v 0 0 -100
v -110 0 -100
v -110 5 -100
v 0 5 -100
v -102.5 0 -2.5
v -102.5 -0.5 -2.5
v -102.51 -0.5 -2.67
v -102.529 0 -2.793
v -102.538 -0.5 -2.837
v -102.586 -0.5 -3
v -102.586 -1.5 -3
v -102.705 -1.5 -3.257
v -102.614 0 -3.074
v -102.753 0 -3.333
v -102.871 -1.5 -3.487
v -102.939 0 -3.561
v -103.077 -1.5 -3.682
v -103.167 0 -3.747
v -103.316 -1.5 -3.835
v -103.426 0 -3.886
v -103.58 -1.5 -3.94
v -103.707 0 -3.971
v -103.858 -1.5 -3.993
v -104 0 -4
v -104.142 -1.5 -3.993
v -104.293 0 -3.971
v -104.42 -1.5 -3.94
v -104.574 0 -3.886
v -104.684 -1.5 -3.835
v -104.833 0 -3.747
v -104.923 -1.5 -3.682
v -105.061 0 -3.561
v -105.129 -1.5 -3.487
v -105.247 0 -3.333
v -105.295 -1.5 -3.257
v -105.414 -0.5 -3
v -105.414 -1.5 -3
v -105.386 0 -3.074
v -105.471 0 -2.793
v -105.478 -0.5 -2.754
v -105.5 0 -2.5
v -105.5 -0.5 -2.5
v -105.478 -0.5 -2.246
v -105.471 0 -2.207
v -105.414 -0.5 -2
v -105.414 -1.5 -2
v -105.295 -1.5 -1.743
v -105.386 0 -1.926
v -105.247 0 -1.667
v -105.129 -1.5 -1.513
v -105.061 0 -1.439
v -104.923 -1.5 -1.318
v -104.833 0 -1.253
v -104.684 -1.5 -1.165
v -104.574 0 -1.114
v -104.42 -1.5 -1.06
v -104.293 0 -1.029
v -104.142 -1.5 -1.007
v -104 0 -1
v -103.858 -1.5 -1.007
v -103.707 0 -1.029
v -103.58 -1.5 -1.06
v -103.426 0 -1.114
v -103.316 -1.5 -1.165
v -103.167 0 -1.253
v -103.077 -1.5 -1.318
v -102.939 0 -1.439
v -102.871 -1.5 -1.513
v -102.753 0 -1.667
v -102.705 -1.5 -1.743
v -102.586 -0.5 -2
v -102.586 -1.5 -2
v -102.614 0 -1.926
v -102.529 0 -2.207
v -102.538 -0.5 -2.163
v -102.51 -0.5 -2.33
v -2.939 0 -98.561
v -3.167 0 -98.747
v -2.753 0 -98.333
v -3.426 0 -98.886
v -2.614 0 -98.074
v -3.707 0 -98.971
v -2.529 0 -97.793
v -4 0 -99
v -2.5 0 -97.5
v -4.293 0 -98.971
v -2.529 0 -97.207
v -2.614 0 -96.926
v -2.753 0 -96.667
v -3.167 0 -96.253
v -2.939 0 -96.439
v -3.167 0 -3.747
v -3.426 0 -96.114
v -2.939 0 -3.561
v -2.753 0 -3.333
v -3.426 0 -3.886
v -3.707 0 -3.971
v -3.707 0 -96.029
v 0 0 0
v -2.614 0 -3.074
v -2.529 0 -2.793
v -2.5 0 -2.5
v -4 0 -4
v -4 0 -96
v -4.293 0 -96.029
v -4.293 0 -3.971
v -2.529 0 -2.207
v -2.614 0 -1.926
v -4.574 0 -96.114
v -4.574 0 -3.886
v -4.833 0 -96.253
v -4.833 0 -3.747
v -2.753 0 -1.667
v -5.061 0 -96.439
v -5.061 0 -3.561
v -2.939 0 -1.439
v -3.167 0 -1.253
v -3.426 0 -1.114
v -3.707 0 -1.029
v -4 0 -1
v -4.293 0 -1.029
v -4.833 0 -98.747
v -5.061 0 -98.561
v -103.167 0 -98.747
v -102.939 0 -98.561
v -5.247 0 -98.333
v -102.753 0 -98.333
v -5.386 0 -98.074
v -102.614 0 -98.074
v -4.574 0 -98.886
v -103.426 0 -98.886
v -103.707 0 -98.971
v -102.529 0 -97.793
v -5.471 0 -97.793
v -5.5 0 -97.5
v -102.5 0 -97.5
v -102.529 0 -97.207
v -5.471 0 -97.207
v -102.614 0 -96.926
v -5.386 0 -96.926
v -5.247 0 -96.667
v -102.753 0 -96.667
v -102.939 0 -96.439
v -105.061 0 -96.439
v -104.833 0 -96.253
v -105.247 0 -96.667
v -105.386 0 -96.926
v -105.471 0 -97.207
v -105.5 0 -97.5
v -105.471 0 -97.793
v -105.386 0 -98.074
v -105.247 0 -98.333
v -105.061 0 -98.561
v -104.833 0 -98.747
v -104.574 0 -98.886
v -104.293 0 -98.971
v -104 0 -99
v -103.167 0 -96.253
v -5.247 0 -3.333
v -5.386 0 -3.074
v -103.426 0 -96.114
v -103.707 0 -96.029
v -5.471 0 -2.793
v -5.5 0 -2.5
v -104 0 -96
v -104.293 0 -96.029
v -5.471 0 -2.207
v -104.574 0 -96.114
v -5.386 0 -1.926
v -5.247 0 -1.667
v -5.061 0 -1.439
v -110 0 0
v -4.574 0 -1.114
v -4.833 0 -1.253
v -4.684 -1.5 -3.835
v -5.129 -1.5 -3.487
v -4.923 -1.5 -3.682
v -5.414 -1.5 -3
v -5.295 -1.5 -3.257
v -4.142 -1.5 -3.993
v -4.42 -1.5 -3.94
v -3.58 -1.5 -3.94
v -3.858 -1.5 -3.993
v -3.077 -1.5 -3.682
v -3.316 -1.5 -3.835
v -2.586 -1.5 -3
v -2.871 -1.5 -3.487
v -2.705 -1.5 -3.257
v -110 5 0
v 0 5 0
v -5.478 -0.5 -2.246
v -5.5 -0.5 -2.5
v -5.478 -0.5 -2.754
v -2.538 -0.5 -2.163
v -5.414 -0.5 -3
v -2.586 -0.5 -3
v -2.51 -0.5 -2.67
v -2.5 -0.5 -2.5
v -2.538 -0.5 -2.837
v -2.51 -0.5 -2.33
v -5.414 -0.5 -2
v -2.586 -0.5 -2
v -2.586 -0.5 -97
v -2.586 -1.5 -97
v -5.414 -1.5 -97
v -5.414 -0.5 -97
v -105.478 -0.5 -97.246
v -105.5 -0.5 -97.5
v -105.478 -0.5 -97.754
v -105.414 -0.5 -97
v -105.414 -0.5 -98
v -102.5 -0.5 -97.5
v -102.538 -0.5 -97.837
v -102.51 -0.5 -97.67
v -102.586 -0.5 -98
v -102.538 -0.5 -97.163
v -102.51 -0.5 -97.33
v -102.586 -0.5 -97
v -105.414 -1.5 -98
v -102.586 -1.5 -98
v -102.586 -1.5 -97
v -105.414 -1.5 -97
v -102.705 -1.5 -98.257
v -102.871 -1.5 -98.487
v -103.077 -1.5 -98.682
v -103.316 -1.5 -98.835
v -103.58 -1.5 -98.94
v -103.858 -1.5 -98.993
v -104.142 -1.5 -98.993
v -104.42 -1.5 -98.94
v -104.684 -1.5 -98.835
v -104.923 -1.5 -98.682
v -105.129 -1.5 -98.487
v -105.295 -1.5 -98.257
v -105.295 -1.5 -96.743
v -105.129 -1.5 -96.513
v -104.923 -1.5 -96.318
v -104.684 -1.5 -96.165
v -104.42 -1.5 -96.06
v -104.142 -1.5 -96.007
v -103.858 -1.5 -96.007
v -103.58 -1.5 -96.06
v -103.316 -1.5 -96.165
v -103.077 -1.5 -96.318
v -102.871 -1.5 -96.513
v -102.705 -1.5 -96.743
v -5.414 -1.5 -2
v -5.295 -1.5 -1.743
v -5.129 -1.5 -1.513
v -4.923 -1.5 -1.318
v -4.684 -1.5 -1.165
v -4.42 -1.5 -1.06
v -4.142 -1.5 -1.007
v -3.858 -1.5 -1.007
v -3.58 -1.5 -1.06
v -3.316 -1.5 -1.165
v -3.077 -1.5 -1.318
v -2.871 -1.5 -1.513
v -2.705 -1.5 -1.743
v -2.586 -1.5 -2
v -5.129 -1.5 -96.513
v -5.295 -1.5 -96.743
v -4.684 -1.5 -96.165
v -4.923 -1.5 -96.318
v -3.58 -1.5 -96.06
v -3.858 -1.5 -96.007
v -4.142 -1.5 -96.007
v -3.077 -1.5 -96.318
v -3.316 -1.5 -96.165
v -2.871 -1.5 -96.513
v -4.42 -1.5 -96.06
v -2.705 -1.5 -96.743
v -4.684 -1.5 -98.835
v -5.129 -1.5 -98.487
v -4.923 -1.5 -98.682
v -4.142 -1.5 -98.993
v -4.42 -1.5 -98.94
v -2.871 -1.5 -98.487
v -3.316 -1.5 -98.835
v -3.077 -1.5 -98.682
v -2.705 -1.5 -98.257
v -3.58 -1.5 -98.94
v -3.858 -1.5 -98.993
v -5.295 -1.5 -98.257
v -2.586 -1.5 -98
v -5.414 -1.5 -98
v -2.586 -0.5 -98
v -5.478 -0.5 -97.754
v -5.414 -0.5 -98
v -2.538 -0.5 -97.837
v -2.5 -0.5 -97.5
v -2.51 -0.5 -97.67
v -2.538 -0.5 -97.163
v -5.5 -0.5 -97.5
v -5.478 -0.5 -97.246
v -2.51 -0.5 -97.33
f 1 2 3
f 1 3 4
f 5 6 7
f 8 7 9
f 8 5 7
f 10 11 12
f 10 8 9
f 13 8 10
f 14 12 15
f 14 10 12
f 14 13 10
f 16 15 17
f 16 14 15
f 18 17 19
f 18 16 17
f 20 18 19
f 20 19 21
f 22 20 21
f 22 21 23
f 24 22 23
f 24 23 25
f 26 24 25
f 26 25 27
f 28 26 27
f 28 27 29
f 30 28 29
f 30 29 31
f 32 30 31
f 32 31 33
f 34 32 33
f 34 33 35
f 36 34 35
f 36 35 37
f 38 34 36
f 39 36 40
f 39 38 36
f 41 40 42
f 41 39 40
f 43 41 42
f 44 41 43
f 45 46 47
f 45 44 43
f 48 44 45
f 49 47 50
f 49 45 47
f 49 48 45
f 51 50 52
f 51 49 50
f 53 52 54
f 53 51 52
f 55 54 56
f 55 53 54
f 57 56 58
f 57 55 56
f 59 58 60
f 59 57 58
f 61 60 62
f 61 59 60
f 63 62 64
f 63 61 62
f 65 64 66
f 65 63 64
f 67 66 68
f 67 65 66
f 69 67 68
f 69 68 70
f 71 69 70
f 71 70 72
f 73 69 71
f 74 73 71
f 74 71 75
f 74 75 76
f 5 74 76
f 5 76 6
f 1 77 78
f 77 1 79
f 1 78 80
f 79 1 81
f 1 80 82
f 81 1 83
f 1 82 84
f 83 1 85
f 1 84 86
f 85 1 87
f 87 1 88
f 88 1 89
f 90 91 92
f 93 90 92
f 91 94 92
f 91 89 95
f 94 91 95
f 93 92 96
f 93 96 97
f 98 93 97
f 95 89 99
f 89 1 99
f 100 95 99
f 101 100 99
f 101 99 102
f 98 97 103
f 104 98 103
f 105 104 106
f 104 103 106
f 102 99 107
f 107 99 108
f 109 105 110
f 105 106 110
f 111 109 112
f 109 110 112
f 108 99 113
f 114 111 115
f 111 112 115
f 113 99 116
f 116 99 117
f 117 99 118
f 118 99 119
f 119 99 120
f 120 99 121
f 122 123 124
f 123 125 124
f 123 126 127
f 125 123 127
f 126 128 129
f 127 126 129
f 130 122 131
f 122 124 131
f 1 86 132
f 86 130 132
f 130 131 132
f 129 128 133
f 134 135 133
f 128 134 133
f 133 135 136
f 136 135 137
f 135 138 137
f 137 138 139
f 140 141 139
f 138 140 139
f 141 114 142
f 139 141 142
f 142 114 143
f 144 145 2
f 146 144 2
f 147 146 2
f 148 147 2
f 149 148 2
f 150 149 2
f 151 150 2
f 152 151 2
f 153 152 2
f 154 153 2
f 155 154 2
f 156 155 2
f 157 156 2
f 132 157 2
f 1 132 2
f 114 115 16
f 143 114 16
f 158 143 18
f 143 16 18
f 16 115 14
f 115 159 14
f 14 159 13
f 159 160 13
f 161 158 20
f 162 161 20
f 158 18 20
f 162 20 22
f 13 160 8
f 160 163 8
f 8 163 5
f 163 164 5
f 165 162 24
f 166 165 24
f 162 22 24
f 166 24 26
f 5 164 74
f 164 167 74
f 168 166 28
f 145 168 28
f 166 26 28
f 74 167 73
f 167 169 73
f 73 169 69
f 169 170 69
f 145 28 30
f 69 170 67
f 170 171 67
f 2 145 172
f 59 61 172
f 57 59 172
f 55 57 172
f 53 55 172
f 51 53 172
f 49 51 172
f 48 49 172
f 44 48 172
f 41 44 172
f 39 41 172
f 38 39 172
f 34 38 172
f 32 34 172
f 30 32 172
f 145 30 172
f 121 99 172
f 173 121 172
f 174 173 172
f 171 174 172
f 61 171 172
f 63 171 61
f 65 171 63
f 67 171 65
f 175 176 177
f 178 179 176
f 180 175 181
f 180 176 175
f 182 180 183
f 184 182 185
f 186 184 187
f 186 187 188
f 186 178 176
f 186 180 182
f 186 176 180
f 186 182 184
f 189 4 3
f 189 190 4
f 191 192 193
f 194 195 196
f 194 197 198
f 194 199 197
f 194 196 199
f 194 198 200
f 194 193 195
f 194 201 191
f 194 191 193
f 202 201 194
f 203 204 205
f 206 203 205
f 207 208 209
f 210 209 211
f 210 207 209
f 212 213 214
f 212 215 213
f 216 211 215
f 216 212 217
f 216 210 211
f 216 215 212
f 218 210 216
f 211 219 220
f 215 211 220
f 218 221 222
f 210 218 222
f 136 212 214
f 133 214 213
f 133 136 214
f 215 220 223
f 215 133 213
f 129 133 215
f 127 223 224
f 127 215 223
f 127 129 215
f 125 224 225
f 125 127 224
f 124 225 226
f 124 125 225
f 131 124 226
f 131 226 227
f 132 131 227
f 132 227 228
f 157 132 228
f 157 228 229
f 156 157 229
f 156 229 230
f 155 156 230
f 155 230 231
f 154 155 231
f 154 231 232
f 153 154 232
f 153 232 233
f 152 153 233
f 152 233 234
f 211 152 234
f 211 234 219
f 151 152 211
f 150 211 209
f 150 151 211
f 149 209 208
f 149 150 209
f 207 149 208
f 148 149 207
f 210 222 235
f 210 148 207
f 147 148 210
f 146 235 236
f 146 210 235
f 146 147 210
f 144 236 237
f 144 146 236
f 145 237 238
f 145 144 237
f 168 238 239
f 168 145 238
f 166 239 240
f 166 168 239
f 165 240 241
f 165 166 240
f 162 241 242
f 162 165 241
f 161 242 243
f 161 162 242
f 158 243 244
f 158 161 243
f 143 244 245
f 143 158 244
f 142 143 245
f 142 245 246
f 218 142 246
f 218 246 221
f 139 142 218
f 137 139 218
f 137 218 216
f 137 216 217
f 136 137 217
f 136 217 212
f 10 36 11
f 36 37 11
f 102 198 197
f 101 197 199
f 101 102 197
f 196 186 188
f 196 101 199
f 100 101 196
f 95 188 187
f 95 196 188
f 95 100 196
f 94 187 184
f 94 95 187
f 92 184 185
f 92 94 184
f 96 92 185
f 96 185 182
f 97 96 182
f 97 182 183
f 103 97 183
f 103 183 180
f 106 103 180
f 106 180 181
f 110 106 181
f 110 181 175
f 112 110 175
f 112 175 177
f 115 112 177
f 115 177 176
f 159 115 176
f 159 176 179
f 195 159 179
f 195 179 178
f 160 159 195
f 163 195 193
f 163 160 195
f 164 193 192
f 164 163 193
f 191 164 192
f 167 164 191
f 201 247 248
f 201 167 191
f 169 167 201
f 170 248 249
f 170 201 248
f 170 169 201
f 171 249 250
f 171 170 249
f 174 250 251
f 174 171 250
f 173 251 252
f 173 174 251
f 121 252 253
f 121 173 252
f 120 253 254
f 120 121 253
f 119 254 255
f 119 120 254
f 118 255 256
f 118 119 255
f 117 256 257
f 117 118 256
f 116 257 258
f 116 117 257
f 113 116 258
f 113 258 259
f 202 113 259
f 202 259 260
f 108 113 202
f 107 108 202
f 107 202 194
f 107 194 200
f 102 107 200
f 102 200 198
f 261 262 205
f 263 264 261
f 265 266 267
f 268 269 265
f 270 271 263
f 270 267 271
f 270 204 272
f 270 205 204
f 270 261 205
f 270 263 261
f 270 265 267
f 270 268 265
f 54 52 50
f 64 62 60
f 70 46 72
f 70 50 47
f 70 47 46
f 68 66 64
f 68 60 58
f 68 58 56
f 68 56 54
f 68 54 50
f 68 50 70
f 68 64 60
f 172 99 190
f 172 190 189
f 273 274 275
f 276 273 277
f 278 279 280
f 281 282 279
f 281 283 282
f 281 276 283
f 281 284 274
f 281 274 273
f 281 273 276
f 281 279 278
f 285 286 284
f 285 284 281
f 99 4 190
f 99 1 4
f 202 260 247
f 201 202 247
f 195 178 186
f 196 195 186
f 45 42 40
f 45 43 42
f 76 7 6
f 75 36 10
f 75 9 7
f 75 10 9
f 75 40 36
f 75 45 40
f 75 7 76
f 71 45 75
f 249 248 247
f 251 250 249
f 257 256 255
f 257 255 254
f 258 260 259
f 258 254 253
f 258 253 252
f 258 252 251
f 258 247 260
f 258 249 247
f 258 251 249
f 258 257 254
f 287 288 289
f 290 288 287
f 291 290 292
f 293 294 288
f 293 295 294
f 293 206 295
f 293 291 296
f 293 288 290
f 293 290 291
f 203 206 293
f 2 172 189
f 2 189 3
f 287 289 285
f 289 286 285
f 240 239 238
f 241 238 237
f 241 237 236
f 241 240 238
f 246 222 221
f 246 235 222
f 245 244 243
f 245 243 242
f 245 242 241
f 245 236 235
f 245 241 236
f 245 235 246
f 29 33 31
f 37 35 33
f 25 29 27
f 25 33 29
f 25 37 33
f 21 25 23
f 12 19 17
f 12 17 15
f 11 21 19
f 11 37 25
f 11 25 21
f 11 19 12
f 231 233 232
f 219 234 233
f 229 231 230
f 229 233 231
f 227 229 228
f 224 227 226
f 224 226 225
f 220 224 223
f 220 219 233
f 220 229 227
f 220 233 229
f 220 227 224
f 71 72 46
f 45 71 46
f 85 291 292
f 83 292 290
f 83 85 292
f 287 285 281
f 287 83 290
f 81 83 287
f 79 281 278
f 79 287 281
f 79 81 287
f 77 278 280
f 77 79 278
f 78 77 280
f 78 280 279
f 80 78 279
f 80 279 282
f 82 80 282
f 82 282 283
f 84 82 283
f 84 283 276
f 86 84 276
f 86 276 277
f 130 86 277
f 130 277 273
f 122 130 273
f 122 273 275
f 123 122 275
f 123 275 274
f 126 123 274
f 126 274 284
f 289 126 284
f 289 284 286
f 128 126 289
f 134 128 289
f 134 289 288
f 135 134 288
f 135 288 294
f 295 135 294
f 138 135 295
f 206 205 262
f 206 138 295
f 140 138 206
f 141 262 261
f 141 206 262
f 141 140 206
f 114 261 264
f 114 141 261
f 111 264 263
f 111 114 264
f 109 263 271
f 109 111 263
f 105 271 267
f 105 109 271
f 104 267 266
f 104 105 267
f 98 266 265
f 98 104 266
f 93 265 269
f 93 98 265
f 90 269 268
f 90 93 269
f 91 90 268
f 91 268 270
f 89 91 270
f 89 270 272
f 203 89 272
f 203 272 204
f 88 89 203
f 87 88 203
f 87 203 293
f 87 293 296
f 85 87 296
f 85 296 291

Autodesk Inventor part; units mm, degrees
ref_plane "YZ Plane" through (0, 0, 0) normal (1, 0, 0) x (0, 1, 0)
ref_plane "XZ Plane" through (0, 0, 0) normal (0, 1, 0) x (-1, 0, 0)
ref_plane "XY Plane" through (0, 0, 0) normal (0, 0, 1) x (1, 0, 0)
sketch "Sketch1" plane through (0, 0, 0) normal (0, 1, 0) x (-1, 0, 0)
  line L0 (0, 0) -> (110, 0)
  line L1 (110, 0) -> (110, -100)
  line L2 (110, -100) -> (0, -100)
  line L3 (0, -100) -> (0, 0)
  dimension "d0" = 110
  dimension "d1" = 100
extrude "Extrusion1" add sketch "Sketch1" along normal blind 5
sketch "Sketch2" plane through (0, 5, 0) normal (0, 1, 0) x (1, 0, 0)
  point P0 (0, 0)
sketch "Sketch3" plane through (0, 0, 0) normal (0, -1, 0) x (1, 0, 0)
  circle A0 centre (-4, -2.5) radius 1.5
  point P0 (0, 0)
  dimension "d4" = 3
extrude "Extrusion2" add sketch "Sketch3" along normal blind 1.5
sketch "Sketch4" plane through (-4, -1.5, -2.5) normal (0, -1, 0) x (1, 0, 0)
  point P0 (4, 2.5)
sketch "Sketch5" plane through (-4, -1.5, -2.5) normal (0, -1, 0) x (1, 0, 0)
  line L0 (1.5, 0.5) -> (-1.5, 0.5)
  line L1 (-1.5, 0.5) -> (-1.5, -0.5)
  line L2 (-1.5, -0.5) -> (1.5, -0.5)
  line L3 (1.5, -0.5) -> (1.5, 0.5)
  line L4 (1.5, 0.5) -> (-1.5, -0.5) construction
  line L5 (-1.5, 0.5) -> (1.5, -0.5) construction
  point P0 (4, 2.5)
  point P1 (0, 0)
  dimension "d7" = 1
extrude "Extrusion3" cut sketch "Sketch5" against normal blind 1
pattern_linear "Rectangular Pattern1" count 2 spacing 100 along (-1, 0, 0) of "Extrusion3", "Extrusion2"
pattern_linear "Rectangular Pattern2" count 2 spacing 95 along (0, 0, -1) of "Extrusion2", "Extrusion3"
pattern_linear "Rectangular Pattern3" count 2 spacing 95 along (0, 0, -1) of "Extrusion3", "Extrusion2", "Rectangular Pattern1"
properties part number "bottom part"
